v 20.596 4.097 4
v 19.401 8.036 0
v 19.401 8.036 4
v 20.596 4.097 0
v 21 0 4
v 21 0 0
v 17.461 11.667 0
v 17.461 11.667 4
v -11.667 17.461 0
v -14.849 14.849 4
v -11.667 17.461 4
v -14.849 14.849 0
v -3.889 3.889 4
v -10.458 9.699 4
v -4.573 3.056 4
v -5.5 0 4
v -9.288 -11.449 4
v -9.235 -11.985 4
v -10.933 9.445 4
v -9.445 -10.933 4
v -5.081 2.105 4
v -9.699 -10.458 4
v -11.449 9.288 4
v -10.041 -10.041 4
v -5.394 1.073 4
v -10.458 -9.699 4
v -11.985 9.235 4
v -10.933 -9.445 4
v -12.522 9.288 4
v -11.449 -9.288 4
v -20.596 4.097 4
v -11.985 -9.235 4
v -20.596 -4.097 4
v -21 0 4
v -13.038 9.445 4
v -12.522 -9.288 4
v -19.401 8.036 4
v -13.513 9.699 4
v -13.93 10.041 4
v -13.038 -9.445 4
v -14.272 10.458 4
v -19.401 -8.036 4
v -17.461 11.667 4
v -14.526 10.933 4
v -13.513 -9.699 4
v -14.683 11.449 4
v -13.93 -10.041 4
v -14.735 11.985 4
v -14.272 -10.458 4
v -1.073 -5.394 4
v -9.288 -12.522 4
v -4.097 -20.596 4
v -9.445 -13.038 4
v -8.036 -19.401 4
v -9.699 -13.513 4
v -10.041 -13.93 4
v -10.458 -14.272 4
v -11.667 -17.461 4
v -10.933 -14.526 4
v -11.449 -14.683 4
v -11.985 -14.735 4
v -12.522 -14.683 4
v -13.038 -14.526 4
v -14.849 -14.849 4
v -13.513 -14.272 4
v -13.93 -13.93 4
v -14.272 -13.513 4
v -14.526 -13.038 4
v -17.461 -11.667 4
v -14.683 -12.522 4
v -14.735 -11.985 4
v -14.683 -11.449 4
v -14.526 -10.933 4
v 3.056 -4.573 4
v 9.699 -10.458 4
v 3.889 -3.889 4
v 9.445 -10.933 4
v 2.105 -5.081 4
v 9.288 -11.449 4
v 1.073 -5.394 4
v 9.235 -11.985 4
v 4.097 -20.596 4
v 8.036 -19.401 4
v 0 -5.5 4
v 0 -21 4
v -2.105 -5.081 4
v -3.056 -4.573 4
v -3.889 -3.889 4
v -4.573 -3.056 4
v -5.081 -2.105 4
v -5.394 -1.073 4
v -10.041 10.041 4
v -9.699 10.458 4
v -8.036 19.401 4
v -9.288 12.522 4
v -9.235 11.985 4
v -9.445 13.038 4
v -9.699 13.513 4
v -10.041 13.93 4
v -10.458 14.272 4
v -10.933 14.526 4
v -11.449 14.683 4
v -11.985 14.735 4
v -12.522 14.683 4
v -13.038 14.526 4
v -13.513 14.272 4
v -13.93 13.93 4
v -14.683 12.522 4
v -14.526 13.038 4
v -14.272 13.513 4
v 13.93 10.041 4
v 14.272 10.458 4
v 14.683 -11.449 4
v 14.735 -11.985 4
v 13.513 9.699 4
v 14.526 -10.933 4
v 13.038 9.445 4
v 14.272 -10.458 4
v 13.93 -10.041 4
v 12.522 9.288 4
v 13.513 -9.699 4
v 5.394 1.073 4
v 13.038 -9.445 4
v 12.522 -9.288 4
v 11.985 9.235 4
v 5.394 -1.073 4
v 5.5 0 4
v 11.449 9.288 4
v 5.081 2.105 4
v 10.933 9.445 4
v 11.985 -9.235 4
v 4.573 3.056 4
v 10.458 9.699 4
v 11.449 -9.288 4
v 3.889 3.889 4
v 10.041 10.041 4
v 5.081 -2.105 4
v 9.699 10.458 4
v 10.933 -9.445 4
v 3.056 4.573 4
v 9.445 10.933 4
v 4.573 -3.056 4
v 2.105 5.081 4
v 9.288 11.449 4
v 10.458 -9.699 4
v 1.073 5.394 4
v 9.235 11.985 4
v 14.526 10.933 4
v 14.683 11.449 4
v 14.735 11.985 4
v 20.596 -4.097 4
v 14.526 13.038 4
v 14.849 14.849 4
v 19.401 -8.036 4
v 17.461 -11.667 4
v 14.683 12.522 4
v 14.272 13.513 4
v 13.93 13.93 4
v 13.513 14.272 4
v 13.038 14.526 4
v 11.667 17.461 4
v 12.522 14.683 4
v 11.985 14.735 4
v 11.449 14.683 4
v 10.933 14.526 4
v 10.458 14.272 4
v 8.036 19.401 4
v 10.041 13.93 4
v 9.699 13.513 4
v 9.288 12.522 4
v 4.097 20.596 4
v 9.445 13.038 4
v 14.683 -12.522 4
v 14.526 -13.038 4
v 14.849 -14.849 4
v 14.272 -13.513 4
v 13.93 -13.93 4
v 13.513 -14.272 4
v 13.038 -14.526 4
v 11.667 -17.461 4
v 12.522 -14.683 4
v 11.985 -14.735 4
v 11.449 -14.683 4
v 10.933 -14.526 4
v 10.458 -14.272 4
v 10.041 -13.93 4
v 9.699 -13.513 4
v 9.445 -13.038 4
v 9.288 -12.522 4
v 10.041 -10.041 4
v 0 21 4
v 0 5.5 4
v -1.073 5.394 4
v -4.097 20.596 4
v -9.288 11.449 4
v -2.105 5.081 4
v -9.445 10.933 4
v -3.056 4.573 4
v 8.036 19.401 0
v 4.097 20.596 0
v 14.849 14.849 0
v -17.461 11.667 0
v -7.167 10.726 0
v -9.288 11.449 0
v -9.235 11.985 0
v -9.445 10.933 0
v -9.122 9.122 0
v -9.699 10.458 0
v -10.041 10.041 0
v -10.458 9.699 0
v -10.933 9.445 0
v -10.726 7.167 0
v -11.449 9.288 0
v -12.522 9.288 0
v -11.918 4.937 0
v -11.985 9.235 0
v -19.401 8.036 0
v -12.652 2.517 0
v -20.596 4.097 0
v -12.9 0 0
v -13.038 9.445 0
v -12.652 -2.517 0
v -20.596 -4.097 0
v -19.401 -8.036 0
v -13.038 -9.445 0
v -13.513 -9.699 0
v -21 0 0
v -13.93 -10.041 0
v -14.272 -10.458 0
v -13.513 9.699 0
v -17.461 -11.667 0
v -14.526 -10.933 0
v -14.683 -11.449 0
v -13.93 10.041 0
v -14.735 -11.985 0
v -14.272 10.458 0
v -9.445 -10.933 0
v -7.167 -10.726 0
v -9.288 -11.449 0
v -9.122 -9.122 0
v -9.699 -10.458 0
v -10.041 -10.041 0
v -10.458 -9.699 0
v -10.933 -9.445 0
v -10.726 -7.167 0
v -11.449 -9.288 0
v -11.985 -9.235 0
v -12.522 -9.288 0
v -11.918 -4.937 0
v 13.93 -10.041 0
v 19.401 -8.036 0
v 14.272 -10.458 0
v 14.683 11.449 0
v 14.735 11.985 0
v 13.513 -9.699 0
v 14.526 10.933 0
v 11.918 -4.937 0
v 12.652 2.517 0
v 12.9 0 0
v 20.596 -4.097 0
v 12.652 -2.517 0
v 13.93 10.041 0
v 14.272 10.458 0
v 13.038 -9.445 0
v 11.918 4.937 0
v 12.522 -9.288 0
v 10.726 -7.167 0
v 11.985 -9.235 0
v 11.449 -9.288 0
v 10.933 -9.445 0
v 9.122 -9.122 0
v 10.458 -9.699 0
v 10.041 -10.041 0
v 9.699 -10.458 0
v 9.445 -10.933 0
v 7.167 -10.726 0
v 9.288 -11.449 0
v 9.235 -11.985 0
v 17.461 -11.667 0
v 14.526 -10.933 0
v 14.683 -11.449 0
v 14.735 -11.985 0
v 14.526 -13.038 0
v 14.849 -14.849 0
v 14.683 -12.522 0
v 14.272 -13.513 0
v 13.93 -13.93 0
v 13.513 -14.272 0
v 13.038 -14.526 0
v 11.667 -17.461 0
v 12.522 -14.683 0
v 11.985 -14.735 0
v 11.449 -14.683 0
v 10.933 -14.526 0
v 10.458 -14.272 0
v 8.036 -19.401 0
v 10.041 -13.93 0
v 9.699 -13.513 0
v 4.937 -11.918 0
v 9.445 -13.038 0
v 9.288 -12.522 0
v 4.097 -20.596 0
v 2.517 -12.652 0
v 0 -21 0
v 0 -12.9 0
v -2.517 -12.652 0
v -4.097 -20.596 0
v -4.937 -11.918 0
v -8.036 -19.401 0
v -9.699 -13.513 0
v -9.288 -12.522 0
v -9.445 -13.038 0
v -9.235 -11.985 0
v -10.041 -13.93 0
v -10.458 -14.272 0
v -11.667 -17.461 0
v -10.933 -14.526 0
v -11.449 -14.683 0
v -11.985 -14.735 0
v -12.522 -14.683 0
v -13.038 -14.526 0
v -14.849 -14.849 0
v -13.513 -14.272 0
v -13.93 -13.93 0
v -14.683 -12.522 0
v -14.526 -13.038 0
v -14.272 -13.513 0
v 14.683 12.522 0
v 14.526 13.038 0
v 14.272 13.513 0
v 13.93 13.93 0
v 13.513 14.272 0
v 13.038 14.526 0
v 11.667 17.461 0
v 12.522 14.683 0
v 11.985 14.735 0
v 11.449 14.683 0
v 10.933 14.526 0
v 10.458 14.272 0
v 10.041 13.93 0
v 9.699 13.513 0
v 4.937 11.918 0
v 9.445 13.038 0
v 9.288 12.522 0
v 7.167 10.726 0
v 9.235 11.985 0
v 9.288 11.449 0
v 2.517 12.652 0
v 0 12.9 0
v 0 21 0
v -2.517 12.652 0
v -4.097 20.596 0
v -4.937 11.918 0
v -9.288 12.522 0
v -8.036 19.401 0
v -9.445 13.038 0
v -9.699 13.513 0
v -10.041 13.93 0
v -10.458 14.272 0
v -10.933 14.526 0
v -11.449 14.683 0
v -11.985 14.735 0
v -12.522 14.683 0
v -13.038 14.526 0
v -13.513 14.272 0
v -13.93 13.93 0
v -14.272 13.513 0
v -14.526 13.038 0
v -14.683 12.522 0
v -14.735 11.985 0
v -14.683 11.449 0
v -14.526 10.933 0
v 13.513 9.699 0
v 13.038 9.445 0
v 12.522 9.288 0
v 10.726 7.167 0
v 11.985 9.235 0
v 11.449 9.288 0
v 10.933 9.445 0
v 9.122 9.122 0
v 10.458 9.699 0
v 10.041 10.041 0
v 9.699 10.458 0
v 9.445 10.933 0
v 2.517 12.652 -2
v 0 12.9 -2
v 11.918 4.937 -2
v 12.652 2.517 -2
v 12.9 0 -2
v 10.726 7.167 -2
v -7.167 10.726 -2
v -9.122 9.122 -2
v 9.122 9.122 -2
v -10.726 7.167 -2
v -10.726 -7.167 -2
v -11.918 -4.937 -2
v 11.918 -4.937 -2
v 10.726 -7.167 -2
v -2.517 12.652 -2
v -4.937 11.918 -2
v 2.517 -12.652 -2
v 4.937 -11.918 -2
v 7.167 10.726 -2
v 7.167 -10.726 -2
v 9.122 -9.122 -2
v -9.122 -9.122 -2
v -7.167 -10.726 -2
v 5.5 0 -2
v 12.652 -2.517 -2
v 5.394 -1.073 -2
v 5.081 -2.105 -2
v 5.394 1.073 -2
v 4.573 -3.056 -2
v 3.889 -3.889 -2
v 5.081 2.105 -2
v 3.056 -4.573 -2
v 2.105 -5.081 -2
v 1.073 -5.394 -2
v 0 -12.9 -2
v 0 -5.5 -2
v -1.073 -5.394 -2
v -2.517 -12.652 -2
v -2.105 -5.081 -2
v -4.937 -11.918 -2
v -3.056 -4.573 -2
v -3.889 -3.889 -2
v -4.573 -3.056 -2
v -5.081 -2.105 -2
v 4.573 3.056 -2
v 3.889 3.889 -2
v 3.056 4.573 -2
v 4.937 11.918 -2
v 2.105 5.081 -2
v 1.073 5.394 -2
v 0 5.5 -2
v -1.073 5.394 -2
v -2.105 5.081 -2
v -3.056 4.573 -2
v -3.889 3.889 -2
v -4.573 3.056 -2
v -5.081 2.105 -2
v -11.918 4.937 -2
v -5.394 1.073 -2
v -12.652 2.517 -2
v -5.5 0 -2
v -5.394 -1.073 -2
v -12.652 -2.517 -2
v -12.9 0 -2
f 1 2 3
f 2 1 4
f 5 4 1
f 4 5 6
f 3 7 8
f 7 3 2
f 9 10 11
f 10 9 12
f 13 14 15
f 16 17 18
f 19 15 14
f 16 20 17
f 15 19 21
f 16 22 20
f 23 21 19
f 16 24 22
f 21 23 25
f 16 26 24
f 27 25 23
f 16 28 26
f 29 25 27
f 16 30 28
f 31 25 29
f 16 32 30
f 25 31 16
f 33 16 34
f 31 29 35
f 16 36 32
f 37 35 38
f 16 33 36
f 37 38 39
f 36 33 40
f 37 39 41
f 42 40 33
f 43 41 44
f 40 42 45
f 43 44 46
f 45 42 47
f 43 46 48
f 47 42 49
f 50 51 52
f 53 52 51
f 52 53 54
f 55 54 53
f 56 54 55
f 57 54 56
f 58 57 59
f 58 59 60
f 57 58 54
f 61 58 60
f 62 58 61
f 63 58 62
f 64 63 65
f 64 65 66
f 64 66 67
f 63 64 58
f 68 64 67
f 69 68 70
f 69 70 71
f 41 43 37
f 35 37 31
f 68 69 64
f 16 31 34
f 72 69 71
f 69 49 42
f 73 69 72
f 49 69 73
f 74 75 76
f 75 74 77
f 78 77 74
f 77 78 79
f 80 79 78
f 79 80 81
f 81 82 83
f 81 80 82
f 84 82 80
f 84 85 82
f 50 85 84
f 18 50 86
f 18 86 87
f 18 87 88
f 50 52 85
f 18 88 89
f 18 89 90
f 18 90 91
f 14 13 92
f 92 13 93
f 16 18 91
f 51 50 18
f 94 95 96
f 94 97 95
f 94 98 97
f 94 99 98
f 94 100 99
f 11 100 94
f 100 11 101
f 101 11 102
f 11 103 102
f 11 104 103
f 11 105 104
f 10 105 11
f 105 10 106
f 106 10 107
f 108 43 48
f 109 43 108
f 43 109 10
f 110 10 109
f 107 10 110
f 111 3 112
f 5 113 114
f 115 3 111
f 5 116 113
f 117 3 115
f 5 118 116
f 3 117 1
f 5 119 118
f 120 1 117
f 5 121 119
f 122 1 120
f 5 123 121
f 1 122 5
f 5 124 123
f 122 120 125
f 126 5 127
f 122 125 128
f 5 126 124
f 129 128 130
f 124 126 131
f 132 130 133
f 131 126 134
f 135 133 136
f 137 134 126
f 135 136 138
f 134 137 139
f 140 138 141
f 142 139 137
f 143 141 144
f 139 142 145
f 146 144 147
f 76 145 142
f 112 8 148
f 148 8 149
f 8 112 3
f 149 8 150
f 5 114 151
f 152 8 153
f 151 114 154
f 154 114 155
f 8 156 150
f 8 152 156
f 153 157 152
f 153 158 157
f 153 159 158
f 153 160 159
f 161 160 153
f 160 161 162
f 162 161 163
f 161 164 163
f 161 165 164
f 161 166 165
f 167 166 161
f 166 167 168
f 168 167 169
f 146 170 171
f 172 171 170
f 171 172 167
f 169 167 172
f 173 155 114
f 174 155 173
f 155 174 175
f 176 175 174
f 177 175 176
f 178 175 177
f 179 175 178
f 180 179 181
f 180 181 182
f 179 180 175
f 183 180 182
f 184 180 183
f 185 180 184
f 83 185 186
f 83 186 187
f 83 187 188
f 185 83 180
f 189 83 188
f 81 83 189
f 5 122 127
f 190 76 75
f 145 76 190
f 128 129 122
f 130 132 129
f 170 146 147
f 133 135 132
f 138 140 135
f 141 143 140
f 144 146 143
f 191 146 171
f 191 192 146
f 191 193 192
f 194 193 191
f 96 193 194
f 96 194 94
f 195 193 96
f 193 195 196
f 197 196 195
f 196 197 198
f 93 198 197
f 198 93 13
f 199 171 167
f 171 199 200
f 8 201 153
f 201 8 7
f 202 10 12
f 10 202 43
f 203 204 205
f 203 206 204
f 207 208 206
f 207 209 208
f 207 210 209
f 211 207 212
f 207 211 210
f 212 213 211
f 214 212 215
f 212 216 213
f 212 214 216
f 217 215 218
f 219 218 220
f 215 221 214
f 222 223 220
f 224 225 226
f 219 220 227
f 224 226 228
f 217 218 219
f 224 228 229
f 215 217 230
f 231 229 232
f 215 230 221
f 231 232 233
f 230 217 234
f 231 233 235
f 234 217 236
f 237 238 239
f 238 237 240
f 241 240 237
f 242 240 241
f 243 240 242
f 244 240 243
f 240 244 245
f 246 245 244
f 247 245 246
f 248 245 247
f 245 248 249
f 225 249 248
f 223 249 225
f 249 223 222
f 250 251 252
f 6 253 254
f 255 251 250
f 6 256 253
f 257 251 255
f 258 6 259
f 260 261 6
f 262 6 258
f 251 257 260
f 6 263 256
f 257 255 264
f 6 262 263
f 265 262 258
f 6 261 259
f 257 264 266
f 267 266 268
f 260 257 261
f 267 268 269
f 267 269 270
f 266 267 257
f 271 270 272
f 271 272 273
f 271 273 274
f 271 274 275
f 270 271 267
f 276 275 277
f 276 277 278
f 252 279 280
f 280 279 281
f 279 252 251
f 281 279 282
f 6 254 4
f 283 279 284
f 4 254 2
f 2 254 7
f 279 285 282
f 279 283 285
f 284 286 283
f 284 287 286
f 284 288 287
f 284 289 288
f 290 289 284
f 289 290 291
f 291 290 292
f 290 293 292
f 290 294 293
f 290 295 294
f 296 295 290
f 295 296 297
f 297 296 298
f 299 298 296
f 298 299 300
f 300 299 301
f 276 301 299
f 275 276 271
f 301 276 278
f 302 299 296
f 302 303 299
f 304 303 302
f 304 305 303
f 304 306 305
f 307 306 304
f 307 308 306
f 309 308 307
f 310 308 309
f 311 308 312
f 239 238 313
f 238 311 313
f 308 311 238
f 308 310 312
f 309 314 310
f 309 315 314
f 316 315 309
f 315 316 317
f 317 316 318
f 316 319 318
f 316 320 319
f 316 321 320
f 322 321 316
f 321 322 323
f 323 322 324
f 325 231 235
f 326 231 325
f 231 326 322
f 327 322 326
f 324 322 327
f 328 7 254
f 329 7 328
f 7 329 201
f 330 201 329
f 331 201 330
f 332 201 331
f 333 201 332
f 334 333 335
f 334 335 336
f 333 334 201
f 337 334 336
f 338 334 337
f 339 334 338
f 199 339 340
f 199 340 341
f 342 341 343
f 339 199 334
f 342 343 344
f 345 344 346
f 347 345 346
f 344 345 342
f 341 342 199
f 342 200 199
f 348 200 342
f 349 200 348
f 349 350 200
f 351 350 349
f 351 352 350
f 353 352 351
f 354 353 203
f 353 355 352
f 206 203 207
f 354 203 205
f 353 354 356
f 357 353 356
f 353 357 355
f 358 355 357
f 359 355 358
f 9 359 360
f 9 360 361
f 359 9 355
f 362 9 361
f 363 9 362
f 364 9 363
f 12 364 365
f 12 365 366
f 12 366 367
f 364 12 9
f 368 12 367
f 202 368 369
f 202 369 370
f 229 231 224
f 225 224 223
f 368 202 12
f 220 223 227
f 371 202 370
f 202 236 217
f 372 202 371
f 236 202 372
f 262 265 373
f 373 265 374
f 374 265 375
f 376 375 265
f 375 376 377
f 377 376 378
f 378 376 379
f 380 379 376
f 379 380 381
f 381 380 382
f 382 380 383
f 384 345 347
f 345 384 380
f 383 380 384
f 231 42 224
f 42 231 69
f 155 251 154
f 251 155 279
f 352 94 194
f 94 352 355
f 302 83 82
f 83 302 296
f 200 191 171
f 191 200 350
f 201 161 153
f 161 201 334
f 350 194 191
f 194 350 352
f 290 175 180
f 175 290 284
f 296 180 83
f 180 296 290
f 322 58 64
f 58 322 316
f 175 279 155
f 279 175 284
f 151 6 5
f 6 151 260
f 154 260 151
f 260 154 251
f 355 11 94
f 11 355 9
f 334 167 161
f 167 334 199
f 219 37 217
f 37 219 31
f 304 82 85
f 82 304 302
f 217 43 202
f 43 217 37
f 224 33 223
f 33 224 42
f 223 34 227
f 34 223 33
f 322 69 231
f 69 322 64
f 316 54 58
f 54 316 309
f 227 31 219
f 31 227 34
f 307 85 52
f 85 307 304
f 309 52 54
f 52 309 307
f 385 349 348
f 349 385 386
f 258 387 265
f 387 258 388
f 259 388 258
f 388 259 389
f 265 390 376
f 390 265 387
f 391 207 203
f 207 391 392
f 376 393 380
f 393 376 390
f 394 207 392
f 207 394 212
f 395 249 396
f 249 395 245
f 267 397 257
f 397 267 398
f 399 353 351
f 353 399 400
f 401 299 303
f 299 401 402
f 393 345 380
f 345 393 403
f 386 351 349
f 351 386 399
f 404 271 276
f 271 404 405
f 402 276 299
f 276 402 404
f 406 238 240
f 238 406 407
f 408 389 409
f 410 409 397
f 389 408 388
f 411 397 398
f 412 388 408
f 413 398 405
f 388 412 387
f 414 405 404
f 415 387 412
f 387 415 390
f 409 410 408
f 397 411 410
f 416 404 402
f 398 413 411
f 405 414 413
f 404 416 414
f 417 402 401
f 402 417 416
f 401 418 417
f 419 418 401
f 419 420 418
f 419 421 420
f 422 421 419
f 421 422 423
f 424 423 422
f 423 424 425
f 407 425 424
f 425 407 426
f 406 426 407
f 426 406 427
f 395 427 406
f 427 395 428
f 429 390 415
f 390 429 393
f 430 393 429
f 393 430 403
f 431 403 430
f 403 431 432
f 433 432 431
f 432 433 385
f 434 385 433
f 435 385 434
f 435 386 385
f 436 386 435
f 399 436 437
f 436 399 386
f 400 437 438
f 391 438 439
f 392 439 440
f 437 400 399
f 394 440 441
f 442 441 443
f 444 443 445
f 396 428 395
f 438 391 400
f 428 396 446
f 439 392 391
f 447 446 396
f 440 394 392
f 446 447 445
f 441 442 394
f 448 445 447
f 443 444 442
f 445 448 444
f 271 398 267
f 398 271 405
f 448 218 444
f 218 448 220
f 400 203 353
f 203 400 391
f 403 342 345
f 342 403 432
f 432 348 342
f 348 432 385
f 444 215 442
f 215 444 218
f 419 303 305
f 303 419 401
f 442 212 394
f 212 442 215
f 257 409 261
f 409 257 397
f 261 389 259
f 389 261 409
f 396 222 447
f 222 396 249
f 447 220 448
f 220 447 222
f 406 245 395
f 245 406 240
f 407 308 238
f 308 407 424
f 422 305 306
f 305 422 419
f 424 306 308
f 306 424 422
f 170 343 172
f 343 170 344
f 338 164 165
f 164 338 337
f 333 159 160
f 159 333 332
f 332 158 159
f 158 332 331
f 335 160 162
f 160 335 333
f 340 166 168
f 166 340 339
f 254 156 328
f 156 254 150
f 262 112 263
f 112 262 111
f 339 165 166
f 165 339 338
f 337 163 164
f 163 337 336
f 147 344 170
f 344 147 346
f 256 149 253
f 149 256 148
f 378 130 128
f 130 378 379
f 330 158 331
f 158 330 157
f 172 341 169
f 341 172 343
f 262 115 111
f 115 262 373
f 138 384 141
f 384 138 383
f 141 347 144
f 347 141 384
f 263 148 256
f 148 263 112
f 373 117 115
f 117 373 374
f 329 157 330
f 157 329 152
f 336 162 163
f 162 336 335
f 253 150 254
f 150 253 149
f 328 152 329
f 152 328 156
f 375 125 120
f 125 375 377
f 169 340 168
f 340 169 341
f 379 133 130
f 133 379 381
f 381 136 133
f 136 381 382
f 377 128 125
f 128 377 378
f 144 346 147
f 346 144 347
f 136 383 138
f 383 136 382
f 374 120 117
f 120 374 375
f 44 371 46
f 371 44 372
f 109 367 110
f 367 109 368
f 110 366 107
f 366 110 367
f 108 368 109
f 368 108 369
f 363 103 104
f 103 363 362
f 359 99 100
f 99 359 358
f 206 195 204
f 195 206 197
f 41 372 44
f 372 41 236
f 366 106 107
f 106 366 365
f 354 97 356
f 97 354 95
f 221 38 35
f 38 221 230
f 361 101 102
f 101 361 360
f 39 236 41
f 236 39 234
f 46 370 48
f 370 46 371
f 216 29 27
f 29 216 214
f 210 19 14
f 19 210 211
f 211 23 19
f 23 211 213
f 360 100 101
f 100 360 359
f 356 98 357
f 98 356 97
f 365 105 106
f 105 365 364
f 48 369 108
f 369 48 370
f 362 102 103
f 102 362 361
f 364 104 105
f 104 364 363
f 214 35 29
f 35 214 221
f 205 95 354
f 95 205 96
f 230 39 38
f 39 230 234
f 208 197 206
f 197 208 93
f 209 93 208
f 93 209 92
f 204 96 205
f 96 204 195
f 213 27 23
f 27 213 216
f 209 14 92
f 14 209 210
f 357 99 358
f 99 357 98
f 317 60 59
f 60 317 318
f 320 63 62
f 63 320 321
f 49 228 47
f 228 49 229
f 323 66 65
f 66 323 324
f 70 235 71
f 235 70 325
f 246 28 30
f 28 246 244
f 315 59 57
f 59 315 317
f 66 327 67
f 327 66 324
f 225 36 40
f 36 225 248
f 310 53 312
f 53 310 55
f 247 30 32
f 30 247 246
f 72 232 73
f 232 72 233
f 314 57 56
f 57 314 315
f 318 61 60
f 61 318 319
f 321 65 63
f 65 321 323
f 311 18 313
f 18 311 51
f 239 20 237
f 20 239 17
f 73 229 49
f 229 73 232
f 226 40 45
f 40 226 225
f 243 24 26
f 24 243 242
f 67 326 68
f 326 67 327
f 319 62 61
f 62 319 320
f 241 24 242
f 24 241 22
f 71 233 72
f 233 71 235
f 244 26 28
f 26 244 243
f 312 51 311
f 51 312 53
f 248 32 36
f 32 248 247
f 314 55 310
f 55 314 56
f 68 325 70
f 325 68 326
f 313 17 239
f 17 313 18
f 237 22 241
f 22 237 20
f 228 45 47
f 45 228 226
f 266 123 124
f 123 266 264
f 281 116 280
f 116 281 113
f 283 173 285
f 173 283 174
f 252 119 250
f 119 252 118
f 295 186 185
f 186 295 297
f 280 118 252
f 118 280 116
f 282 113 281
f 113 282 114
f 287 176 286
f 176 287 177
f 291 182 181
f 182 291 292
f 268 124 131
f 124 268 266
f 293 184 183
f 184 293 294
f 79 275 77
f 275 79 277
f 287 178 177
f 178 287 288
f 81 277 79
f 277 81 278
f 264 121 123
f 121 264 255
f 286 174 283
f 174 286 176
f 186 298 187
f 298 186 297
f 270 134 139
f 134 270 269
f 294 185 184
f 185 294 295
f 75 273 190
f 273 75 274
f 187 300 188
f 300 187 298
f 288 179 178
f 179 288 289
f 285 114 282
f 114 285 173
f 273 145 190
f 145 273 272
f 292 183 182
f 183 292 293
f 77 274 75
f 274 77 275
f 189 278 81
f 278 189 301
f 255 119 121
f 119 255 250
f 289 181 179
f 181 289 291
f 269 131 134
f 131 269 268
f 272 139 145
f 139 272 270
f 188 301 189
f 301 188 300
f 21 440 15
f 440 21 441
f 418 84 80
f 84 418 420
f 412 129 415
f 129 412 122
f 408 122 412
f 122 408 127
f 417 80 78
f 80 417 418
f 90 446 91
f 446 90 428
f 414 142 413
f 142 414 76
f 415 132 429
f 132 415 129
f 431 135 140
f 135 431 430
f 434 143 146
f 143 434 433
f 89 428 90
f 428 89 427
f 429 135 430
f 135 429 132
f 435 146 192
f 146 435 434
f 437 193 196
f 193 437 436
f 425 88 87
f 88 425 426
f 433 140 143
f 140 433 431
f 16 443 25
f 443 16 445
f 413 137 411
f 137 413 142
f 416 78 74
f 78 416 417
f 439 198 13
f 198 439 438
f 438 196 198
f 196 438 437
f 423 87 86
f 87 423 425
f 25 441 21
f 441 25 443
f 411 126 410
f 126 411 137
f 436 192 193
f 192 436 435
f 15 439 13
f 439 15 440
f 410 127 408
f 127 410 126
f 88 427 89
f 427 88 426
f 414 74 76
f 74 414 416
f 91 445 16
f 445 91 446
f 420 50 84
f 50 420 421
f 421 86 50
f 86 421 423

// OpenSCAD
$fn = 32;

// ----------------------------------------------------------------------
// Retaining cap: 6000 cover, 42 mm, spigot 25.8 mm
// ----------------------------------------------------------------------

// --- parameters (mm) ---
cover_d = 42;             // cover diameter
cover_t = 4;              // cover thickness
spigot_d = 25.8;          // spigot that enters the housing
spigot_h = 2;             // spigot height
shaft_d = 11;             // shaft opening
bolt_d = 5.5;             // bolt clearance
bolt_r = 16.95;           // bolt circle radius

module cover() {
  cylinder(h = cover_t, d = cover_d);
}

module spigot() {
  /* sunk 1 mm into the cover; the spigot sets the overall height */
  translate([0, 0, -spigot_h]) cylinder(h = spigot_h + 1, d = spigot_d);
}

difference() {
  union() {
    cover();
    spigot();
  }
  for (i = [0 : 3]) rotate([0, 0, 45 + i * 90]) translate([bolt_r, 0, -spigot_h - 1])
    cylinder(h = spigot_h + cover_t + 2, d = bolt_d);
  translate([0, 0, -spigot_h - 1]) cylinder(h = spigot_h + cover_t + 2, d = shaft_d);
}
